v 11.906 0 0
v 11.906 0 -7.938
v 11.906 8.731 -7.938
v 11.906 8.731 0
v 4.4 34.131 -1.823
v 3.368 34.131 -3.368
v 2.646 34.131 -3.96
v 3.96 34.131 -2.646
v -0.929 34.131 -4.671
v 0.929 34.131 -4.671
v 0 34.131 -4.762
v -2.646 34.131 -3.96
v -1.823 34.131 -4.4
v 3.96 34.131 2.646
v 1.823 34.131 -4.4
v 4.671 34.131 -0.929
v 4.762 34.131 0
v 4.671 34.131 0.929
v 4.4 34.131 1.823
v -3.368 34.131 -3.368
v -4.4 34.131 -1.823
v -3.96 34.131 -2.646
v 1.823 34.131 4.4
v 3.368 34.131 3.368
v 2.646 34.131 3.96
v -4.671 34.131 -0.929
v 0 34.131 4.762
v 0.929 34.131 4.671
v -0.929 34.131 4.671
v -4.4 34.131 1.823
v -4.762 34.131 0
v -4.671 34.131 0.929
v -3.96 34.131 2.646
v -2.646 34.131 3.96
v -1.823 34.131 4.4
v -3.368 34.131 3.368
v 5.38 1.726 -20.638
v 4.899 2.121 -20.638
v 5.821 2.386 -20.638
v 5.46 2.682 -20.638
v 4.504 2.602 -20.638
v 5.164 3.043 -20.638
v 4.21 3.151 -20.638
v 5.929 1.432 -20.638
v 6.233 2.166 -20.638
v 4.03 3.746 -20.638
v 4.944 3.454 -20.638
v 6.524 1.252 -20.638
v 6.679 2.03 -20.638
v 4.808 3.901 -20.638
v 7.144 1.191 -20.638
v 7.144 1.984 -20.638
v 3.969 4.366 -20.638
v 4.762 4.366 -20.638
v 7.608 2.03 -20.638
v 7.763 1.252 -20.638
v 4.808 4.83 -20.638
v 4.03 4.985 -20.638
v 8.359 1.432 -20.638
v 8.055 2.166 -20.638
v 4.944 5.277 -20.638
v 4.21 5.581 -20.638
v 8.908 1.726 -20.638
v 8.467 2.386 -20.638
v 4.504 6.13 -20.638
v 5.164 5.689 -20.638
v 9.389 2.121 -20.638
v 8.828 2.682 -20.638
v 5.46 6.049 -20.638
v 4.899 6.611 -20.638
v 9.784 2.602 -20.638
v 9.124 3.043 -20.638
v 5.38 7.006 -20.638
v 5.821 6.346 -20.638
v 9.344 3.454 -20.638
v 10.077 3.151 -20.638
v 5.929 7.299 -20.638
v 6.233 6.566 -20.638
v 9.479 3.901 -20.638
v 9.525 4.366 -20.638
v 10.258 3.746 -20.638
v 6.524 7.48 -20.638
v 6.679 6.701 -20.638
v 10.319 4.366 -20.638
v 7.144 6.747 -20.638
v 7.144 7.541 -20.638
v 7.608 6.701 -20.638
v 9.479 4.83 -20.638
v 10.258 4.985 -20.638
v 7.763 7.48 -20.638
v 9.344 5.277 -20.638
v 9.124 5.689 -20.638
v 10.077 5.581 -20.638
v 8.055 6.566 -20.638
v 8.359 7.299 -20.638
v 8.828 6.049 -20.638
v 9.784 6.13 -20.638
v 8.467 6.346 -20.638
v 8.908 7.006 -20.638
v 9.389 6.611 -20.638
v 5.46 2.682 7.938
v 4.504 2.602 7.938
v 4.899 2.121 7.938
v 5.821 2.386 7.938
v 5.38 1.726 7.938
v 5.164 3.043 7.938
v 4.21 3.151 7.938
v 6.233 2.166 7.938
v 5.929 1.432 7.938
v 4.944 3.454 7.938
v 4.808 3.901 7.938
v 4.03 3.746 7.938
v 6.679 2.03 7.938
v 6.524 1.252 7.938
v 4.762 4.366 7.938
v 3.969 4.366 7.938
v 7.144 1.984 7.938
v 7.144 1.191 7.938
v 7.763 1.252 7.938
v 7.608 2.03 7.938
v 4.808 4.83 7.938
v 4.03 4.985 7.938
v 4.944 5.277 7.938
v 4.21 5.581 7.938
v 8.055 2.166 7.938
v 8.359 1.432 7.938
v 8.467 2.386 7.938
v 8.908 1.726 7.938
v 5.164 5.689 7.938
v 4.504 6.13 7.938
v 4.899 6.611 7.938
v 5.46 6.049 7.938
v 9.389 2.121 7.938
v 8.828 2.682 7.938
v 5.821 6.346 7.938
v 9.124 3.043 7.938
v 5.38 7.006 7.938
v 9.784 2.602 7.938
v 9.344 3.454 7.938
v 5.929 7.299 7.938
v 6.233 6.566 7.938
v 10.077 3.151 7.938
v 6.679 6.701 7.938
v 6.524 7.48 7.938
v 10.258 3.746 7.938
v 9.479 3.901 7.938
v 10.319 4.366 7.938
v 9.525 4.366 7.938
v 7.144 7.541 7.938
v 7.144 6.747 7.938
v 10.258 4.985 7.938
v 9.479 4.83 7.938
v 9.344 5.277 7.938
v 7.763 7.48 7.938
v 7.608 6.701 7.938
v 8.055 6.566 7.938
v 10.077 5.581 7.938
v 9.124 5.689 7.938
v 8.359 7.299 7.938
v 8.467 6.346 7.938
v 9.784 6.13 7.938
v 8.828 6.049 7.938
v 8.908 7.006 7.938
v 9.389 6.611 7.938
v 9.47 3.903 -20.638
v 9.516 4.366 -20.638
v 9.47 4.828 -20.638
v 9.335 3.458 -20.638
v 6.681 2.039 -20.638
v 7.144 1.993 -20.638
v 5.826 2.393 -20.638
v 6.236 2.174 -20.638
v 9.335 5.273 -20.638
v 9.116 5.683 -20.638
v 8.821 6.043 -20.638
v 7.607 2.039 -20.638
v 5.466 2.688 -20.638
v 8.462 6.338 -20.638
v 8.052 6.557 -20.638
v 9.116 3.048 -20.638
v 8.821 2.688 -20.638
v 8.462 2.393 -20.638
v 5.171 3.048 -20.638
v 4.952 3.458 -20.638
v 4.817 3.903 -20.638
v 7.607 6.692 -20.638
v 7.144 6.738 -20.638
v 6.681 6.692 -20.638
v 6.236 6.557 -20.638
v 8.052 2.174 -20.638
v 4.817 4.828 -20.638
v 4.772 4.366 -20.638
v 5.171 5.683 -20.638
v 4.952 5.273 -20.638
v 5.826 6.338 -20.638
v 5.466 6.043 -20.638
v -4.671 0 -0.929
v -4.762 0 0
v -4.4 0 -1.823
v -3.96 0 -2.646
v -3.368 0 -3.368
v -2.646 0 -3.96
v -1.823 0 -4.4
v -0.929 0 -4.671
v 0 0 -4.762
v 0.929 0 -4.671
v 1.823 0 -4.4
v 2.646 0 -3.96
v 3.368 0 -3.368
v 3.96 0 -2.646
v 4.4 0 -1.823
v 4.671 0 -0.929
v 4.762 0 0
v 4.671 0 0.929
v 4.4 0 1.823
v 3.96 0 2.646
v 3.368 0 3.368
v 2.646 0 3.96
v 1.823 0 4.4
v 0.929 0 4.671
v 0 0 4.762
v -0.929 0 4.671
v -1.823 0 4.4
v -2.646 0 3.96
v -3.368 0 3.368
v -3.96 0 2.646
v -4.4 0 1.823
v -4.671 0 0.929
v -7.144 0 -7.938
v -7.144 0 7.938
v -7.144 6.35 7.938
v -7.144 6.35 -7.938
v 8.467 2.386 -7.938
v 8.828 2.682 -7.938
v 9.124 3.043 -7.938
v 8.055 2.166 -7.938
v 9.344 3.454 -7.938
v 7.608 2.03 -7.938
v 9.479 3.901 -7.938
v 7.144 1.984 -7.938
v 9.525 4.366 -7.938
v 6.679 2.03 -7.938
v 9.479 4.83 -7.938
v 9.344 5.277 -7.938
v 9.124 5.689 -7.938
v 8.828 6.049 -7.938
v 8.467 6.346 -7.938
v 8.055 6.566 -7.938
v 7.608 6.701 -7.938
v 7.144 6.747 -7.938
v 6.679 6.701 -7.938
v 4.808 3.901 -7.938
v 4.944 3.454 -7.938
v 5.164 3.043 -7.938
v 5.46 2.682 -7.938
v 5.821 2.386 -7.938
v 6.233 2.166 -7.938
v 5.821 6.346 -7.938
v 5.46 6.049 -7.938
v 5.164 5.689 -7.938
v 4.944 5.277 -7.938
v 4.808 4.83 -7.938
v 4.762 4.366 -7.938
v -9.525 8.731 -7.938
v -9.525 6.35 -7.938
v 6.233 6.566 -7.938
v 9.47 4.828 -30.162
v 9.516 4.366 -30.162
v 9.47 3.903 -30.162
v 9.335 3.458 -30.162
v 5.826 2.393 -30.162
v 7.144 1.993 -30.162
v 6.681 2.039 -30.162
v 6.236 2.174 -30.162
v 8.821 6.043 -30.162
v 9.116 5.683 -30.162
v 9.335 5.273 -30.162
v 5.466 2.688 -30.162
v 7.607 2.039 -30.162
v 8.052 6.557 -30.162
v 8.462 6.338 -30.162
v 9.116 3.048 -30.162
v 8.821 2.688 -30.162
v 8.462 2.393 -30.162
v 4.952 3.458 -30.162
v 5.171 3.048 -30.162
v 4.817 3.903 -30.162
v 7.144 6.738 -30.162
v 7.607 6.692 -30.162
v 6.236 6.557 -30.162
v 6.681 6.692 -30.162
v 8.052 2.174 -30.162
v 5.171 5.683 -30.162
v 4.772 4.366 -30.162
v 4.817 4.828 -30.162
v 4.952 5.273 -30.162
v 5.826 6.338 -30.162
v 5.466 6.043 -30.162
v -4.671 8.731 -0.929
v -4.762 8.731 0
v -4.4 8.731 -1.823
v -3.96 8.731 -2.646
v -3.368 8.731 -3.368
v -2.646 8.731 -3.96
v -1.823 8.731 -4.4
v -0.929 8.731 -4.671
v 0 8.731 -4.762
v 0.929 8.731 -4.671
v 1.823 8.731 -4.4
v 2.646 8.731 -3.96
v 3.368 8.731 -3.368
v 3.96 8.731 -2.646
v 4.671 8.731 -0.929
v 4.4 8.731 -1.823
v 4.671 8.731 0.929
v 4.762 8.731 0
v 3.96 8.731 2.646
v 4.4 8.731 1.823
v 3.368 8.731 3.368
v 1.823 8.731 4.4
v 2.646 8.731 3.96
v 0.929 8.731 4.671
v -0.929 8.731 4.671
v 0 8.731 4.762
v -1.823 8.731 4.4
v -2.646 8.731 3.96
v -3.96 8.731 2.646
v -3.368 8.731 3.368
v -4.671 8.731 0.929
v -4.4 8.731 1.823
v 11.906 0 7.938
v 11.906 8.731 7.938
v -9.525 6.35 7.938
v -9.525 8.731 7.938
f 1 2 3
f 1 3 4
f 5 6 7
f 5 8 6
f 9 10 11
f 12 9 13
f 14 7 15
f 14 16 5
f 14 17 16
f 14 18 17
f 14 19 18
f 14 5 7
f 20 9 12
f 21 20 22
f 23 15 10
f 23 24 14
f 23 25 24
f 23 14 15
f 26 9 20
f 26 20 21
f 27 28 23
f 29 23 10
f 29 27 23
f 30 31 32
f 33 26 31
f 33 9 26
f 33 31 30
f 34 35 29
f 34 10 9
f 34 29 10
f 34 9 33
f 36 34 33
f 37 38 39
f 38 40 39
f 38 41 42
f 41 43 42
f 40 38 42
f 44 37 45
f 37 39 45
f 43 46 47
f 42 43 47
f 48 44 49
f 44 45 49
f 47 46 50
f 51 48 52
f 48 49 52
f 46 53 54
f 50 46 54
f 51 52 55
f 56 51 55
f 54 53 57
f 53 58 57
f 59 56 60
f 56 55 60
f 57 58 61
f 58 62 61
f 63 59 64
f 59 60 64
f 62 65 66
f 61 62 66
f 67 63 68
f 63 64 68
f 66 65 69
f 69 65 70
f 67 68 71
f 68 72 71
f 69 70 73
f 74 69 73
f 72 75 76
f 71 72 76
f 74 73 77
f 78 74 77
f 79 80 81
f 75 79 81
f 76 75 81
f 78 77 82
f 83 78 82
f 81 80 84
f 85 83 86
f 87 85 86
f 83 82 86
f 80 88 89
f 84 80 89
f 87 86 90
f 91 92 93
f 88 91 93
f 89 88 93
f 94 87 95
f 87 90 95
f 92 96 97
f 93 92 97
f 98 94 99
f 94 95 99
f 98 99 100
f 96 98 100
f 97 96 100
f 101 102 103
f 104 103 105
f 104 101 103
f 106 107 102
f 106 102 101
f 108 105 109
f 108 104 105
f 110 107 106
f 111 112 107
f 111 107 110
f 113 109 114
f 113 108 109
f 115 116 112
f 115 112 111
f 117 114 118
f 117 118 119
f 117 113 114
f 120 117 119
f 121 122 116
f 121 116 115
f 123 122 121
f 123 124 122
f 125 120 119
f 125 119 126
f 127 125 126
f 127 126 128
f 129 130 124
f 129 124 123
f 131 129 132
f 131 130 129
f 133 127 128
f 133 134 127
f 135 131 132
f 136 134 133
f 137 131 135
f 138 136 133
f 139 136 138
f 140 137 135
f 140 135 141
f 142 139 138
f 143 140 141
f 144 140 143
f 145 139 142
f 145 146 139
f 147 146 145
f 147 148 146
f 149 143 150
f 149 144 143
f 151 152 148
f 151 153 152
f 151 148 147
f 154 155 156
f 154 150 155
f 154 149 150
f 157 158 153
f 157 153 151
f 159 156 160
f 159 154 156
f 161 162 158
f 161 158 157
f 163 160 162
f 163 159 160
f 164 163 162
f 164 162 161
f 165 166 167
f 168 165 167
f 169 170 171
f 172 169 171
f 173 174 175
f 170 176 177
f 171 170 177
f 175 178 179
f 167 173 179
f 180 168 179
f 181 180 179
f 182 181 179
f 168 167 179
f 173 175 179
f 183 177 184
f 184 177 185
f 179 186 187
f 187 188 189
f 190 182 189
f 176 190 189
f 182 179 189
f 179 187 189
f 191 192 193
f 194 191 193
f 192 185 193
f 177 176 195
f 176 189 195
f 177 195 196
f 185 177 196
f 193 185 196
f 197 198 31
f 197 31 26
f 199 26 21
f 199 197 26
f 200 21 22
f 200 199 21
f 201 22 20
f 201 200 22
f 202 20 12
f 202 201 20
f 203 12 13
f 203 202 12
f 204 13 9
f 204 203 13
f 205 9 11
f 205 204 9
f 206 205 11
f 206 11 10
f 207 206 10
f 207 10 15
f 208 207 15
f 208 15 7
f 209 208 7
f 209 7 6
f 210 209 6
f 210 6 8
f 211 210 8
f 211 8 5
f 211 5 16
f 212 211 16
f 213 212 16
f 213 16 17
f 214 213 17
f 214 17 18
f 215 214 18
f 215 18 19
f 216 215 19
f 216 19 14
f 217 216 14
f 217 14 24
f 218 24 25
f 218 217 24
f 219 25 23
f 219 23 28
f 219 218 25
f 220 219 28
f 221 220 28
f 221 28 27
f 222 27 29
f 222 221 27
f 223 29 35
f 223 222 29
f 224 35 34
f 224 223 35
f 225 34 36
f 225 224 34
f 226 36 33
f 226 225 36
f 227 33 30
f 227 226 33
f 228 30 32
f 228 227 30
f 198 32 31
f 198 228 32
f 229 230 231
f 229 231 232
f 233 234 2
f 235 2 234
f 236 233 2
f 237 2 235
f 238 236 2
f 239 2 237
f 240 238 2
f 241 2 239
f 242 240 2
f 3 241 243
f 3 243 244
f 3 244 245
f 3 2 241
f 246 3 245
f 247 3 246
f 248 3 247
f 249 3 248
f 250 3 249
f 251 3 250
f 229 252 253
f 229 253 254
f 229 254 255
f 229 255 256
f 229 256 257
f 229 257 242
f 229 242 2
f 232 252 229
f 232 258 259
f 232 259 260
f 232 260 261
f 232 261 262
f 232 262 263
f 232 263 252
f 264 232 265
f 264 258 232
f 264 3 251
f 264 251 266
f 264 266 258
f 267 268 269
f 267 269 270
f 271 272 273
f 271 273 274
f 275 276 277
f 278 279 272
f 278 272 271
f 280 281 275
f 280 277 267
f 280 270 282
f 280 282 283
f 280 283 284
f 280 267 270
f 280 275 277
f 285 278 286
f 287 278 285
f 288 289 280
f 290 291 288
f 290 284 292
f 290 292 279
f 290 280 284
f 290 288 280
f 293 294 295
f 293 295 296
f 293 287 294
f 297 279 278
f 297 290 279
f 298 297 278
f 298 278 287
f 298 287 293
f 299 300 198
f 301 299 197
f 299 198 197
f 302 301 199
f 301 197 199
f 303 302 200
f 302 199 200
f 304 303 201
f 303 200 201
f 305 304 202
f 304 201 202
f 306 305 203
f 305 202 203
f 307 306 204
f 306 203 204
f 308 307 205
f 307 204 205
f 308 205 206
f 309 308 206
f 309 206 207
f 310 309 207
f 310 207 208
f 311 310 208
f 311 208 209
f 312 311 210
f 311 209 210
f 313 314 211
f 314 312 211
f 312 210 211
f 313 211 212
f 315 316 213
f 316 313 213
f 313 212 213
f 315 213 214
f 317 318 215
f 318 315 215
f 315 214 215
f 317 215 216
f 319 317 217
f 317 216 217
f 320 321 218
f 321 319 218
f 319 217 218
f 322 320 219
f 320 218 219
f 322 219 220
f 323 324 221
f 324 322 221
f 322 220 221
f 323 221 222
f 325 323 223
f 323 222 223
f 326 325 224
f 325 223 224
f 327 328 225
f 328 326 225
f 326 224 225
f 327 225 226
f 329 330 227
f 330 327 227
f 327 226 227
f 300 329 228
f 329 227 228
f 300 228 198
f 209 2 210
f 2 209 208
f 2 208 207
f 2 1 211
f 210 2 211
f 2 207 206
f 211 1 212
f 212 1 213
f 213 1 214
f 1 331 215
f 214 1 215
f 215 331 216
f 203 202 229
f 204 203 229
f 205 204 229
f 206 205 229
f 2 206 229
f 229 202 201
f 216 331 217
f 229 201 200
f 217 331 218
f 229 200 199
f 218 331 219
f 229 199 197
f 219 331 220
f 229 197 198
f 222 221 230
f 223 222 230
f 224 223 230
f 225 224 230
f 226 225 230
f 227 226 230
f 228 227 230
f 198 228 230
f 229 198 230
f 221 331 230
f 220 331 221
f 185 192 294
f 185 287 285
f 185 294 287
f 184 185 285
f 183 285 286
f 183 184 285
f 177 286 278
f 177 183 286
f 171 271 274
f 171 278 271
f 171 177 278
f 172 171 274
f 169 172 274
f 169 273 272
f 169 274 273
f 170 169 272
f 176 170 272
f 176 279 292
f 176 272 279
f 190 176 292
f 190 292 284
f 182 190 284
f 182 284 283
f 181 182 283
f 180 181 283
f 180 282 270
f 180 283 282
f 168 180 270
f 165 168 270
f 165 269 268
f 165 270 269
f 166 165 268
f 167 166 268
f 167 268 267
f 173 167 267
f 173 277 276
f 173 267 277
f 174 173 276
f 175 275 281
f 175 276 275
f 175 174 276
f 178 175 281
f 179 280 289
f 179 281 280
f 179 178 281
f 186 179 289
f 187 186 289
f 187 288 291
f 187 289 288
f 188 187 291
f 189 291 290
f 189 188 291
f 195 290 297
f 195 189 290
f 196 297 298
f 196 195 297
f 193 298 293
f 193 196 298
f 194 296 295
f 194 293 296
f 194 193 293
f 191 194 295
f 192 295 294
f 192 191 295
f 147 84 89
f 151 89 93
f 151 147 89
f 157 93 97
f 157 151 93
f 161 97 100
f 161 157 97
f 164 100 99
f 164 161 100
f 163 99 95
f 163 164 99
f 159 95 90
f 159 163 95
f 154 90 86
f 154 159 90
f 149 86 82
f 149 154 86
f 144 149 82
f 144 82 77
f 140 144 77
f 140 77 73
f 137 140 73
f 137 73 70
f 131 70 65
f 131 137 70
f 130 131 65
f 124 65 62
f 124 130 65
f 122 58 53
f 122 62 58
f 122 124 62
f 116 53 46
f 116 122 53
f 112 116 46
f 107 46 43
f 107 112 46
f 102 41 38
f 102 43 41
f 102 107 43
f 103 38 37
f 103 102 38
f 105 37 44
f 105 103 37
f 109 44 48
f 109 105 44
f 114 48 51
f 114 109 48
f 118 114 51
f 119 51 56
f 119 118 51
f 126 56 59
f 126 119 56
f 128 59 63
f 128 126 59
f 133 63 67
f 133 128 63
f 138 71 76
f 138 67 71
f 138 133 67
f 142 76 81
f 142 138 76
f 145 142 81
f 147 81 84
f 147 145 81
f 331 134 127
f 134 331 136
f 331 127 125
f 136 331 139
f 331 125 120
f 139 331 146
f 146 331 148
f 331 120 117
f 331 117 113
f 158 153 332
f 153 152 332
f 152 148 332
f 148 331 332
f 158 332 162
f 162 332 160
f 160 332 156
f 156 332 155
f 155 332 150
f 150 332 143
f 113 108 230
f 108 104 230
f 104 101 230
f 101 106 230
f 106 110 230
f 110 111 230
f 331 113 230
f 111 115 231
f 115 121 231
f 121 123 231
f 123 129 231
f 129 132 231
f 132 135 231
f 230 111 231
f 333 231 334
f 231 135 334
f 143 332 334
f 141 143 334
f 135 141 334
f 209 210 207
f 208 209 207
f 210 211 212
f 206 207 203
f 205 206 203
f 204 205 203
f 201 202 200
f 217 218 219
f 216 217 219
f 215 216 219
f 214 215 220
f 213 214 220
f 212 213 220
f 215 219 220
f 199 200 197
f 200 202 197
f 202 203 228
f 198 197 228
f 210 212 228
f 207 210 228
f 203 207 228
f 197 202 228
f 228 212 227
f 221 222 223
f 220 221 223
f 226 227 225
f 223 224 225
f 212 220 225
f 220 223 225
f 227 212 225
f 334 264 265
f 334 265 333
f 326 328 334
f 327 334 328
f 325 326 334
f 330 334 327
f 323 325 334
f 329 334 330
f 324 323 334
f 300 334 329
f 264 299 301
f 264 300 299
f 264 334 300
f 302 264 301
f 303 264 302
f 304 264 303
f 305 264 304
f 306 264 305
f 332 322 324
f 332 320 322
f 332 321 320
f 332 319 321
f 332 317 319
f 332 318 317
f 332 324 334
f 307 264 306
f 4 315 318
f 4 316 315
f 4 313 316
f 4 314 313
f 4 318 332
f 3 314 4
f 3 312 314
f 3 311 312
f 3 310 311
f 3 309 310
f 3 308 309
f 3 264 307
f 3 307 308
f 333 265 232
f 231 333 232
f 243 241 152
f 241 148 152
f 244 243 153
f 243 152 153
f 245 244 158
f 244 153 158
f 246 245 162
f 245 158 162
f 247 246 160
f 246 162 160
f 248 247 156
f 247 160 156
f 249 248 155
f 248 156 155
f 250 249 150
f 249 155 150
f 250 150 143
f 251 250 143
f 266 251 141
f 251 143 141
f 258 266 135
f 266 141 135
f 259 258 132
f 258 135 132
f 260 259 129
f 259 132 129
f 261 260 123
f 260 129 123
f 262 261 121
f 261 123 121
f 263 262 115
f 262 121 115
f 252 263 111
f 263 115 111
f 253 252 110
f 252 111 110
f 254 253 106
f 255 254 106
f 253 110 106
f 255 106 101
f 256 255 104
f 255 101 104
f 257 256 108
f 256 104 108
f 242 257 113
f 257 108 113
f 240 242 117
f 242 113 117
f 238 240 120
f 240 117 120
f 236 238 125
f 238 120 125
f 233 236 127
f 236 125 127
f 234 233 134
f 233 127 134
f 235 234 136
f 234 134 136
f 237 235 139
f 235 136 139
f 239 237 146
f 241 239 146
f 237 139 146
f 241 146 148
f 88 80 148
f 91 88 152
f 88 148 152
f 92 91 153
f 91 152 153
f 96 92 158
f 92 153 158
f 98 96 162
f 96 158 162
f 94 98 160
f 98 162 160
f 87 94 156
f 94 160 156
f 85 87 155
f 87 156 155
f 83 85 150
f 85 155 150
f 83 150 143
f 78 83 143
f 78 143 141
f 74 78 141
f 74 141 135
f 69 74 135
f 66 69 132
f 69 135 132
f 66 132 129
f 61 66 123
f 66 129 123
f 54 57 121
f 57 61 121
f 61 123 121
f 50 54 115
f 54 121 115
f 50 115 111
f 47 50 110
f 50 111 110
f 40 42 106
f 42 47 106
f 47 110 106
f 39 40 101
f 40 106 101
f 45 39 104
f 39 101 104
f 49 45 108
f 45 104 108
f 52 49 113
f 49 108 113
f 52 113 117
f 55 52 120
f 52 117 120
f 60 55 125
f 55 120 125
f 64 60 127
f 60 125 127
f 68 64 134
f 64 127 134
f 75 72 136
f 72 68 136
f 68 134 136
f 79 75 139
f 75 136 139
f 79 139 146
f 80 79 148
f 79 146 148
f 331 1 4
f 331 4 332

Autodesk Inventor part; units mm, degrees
ref_plane "YZ Plane" through (0, 0, 0) normal (1, 0, 0) x (0, 1, 0)
ref_plane "XZ Plane" through (0, 0, 0) normal (0, 1, 0) x (-1, 0, 0)
ref_plane "XY Plane" through (0, 0, 0) normal (0, 0, 1) x (1, 0, 0)
sketch "Sketch1" plane through (0, 0, 0) normal (0, 1, 0) x (-1, 0, 0)
  circle A0 centre (0, 0) radius 4.7625
  line L0 (0, 0) -> (-11.9062, 0)
  line L1 (-11.9062, 0) -> (-11.9063, 7.9375)
  line L2 (-11.9063, 7.9375) -> (7.1437, 7.9375)
  line L3 (7.1437, 7.9375) -> (7.1437, -7.9375)
  line L4 (7.1437, -7.9375) -> (-11.9062, -7.9375)
  line L5 (-11.9062, -7.9375) -> (-11.9063, 7.9375)
  line L6 (0, -7.9375) -> (9.525, -7.9375)
  line L7 (9.525, -7.9375) -> (9.525, 7.9375)
  line L8 (9.525, 7.9375) -> (0, 7.9375)
  line L9 (0, 7.9375) -> (0, -7.9375)
  point P0 (-11.9063, 0)
  dimension "d0" = 9.525
  dimension "d9" = 15.875
  dimension "d10" = 7.9375
  dimension "d11" = 11.9062
  dimension "d12" = 7.1437
  dimension "d22" = 9.525
extrude "Extrusion1" add sketch "Sketch1" along normal blind 34.1313 contours A0 L9 | L9 L0 A0 | A0 L0 L9
extrude "Extrusion3" add sketch "Sketch1" along normal blind 8.7313 separate body contours A0 L9 L2 L3 L4 | A0 L0 L1 L2 L9 | L9 L4 L5 L0 A0
sketch "Sketch3" plane through (-7.1437, 0, 7.9375) normal (0, 0, 1) x (1, 0, 0)
  line L0 (0, 0) -> (0, 8.7313) projected
  line L1 (0, 4.3656) -> (19.05, 4.3656)
  line L2 (19.05, 0) -> (19.05, 8.7313) projected
  circle A0 centre (14.2875, 4.3656) radius 3.175
  circle A1 centre (14.2875, 4.3656) radius 2.3813
  point P0 (7.1437, 0)
  dimension "d15" = 6.35
  dimension "d16" = 4.7625
  dimension "d17" = 4.7625
extrude "Extrusion4" add sketch "Sketch3" against normal blind 28.575 separate body contours A1 L1 A0 | L1 A0 A1
extrude "Extrusion5" cut sketch "Sketch3" against normal up to surface (15.875 mm away) contours A1 L1 | L1 A1 bodies 2
sketch "Sketch4" plane through (0, 8.7313, 0) normal (0, 1, 0) x (1, 0, 0)
  line L0 (-7.1437, -7.9375) -> (11.9063, -7.9375) projected
  line L1 (0, -7.9375) -> (-9.525, -7.9375)
  line L2 (11.9062, 7.9375) -> (-7.1437, 7.9375) projected
  line L3 (0, 7.9375) -> (-9.525, 7.9375)
  line L4 (-9.525, 7.9375) -> (-9.525, -7.9375)
  line L5 (-7.1437, 7.9375) -> (-7.1437, -7.9375) projected
  line L6 (-7.1437, -7.9375) -> (-7.1437, 7.9375)
  line L7 (0, 0) -> (0, -7.9375)
  point P0 (-7.1437, -7.9375)
  point P1 (-7.1437, 7.9375)
  dimension "d23" = 9.525
extrude "Extrusion6" add sketch "Sketch4" against normal blind 2.3813 bodies 2
sketch "Sketch5" plane through (-7.1437, 0, 7.9375) normal (0, 0, 1) x (1, 0, 0)
  line L0 (19.05, 8.7313) -> (-2.3813, 8.7313) projected
  line L1 (7.1437, 8.7313) -> (7.1437, 34.1313)
  line L2 (11.9062, 34.1313) -> (2.3813, 34.1313) projected
  circle A0 centre (7.1437, 30.9563) radius 1.5875
  point P0 (7.1437, 0)
  dimension "d26" = 3.175
  dimension "d27" = 3.175
sketch "Sketch6" plane through (7.1438, 4.3656, -20.6375) normal (0, 0, -1) x (-1, 0, 0)
  circle A0 centre (0, 0) radius 2.3721
  point P0 (7.1438, -4.3656)
extrude "Extrusion7" add sketch "Sketch6" along normal blind 9.525 bodies 3
equation "\"d0\" = tuningPegDiameter"
equation "\"d9\" = 2 * lockOffset"
equation "\"d10\" = lockOffset"
equation "\"d11\" = lockLongYOffset"
equation "\"d12\" = lockShortYOffset"
equation "\"d22\" = mountExtension"
equation "\"d1\" = tuningPegDepth"
equation "\"d13\" = lockWidth"
equation "\"d15\" = screwOutsideDiameter"
equation "\"d16\" = screwInsideDiameter"
equation "\"d17\" = screwOffset"
equation "\"d20\" = screwExtension"
equation "\"d23\" = mountExtension"
equation "\"d24\" = mountPlateDepth"
equation "\"tuningPegDiameter\" = 9.525"
equation "\"screwOffset\" = 4.7625"
equation "\"screwOutsideDiameter\" = 6.35"
equation "\"screwInsideDiameter\" = 4.7625"
equation "\"screwExtension\" = 12.7"
equation "\"mountPlateDepth\" = 2.38125"
equation "\"holeOffset\" = 3.175"
equation "\"lockOffset\" = 7.9375"
equation "\"mountExtension\" = 9.525"
equation "\"tuningPegDepth\" = 34.13125"
equation "\"lockWidth\" = 8.73125"
equation "\"lockLongYOffset\" = 11.90625"
equation "\"lockShortYOffset\" = 7.14375"
properties part number "TuningPeg"
